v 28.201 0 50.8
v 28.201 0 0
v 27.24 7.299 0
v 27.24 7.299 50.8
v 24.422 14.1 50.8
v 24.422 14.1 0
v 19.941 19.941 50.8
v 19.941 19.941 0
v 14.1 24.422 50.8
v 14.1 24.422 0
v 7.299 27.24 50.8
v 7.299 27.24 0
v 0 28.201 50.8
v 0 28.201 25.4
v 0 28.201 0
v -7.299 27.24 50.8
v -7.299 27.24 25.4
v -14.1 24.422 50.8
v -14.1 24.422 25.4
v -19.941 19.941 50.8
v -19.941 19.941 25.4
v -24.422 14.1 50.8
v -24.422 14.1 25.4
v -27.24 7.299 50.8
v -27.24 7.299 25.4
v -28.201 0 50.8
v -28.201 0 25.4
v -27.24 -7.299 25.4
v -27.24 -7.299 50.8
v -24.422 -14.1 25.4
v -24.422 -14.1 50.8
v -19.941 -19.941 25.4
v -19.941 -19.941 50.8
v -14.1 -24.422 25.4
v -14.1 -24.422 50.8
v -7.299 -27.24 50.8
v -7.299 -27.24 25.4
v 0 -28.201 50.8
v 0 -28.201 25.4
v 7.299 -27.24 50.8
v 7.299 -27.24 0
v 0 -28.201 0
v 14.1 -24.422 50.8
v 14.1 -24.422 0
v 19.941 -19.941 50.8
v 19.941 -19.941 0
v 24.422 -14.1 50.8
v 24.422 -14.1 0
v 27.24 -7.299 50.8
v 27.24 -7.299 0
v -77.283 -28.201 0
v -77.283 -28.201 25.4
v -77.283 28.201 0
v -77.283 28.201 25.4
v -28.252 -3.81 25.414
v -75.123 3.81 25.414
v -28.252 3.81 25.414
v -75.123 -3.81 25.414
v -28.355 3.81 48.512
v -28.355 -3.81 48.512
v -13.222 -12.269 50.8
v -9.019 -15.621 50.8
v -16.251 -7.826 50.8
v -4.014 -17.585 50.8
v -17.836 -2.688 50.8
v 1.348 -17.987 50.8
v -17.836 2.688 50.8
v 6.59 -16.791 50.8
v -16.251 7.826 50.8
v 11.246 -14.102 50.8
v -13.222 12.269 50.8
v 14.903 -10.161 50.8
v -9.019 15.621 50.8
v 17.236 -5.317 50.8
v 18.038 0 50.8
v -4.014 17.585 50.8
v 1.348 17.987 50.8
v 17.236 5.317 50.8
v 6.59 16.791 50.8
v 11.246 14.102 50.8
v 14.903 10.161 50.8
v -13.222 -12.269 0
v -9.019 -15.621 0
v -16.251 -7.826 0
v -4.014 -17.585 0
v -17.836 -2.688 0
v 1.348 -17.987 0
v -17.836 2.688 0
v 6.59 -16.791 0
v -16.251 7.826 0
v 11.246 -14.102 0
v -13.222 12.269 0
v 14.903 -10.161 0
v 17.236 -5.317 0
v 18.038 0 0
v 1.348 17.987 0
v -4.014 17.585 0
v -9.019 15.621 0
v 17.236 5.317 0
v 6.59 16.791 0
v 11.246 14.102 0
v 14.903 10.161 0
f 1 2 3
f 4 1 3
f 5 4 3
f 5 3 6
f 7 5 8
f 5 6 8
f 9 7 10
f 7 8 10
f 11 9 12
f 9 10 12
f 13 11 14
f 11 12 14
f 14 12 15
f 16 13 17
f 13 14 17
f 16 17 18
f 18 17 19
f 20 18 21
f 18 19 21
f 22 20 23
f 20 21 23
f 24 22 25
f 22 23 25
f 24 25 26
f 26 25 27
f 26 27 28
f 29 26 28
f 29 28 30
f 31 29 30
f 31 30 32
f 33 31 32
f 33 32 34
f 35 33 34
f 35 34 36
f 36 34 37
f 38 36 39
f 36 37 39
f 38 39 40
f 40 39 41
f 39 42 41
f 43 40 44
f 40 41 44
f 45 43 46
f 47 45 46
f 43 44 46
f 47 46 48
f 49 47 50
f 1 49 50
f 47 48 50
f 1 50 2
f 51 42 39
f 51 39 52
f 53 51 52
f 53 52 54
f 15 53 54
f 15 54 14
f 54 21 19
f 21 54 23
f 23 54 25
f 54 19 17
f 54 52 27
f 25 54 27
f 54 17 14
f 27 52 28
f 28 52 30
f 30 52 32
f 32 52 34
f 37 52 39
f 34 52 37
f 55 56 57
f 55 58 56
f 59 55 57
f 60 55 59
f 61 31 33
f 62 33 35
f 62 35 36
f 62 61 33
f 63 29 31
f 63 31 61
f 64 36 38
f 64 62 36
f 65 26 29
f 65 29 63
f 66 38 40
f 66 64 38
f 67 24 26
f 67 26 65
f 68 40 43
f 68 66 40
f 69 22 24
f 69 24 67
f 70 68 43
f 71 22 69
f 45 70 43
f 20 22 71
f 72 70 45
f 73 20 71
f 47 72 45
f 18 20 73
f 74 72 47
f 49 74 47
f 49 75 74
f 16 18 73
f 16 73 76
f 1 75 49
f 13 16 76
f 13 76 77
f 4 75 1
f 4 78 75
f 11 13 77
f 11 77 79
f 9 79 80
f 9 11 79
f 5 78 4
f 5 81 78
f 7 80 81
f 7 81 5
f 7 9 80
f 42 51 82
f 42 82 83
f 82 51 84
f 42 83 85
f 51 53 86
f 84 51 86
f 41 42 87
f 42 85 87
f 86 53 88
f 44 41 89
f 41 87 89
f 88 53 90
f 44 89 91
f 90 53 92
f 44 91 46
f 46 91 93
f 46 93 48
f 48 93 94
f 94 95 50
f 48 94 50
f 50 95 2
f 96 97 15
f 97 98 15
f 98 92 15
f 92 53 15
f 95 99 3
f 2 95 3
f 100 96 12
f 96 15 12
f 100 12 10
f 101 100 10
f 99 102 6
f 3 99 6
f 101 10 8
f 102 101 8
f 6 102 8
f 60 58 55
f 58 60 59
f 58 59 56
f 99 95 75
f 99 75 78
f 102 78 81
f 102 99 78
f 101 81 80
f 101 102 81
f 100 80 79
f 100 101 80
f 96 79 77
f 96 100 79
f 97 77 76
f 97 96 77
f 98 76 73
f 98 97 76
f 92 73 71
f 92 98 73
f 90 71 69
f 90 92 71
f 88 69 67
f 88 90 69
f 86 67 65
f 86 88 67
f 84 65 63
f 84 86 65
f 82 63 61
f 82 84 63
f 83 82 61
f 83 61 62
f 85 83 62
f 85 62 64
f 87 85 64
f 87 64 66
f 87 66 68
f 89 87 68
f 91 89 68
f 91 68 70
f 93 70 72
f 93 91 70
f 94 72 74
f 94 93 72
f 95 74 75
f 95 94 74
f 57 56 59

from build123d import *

# Parameters (mm, degrees)
F0_R     = 28.2006722859
F0_R_2   = 18.0375708909
F1_DEPTH = 50.8
F3_DEPTH = 25.4
F5_DEPTH = 3.81


with BuildPart() as f1:
    # F0 (on Top) → F1 (new body)
    with BuildSketch(Plane.XY):
        Circle(F0_R)
        Circle(F0_R_2, mode=Mode.SUBTRACT)
    extrude(amount=F1_DEPTH)

    # F2 (on face) → F3 (join)
    with BuildSketch(Plane(origin=(0, 0, 0), x_dir=(1, 0, 0), z_dir=(0, 0, -1))):
        with BuildLine():
            Line((-77.2829676373, -28.2006722859), (0, -28.2006722859))
            ThreePointArc((0, -28.2006722859), (-28.2006722859, 0), (0, 28.2006722859))
            Line((0, 28.2006722859), (-77.2829676373, 28.2006722859))
            Line((-77.2829676373, 28.2006722859), (-77.2829676373, -28.2006722859))
        make_face()
    extrude(amount=-F3_DEPTH)


with BuildPart() as f5:
    # F4 (on Front) → F5 (new body, symmetric)
    with BuildSketch(Plane.XZ):
        Polygon((-28.2520439008, 25.4135411233), (-28.3552613109, 48.512134701), (-75.1233696938, 25.4135411233), align=None)
    extrude(amount=F5_DEPTH, both=True)


solid = Compound([f1.part, f5.part])
